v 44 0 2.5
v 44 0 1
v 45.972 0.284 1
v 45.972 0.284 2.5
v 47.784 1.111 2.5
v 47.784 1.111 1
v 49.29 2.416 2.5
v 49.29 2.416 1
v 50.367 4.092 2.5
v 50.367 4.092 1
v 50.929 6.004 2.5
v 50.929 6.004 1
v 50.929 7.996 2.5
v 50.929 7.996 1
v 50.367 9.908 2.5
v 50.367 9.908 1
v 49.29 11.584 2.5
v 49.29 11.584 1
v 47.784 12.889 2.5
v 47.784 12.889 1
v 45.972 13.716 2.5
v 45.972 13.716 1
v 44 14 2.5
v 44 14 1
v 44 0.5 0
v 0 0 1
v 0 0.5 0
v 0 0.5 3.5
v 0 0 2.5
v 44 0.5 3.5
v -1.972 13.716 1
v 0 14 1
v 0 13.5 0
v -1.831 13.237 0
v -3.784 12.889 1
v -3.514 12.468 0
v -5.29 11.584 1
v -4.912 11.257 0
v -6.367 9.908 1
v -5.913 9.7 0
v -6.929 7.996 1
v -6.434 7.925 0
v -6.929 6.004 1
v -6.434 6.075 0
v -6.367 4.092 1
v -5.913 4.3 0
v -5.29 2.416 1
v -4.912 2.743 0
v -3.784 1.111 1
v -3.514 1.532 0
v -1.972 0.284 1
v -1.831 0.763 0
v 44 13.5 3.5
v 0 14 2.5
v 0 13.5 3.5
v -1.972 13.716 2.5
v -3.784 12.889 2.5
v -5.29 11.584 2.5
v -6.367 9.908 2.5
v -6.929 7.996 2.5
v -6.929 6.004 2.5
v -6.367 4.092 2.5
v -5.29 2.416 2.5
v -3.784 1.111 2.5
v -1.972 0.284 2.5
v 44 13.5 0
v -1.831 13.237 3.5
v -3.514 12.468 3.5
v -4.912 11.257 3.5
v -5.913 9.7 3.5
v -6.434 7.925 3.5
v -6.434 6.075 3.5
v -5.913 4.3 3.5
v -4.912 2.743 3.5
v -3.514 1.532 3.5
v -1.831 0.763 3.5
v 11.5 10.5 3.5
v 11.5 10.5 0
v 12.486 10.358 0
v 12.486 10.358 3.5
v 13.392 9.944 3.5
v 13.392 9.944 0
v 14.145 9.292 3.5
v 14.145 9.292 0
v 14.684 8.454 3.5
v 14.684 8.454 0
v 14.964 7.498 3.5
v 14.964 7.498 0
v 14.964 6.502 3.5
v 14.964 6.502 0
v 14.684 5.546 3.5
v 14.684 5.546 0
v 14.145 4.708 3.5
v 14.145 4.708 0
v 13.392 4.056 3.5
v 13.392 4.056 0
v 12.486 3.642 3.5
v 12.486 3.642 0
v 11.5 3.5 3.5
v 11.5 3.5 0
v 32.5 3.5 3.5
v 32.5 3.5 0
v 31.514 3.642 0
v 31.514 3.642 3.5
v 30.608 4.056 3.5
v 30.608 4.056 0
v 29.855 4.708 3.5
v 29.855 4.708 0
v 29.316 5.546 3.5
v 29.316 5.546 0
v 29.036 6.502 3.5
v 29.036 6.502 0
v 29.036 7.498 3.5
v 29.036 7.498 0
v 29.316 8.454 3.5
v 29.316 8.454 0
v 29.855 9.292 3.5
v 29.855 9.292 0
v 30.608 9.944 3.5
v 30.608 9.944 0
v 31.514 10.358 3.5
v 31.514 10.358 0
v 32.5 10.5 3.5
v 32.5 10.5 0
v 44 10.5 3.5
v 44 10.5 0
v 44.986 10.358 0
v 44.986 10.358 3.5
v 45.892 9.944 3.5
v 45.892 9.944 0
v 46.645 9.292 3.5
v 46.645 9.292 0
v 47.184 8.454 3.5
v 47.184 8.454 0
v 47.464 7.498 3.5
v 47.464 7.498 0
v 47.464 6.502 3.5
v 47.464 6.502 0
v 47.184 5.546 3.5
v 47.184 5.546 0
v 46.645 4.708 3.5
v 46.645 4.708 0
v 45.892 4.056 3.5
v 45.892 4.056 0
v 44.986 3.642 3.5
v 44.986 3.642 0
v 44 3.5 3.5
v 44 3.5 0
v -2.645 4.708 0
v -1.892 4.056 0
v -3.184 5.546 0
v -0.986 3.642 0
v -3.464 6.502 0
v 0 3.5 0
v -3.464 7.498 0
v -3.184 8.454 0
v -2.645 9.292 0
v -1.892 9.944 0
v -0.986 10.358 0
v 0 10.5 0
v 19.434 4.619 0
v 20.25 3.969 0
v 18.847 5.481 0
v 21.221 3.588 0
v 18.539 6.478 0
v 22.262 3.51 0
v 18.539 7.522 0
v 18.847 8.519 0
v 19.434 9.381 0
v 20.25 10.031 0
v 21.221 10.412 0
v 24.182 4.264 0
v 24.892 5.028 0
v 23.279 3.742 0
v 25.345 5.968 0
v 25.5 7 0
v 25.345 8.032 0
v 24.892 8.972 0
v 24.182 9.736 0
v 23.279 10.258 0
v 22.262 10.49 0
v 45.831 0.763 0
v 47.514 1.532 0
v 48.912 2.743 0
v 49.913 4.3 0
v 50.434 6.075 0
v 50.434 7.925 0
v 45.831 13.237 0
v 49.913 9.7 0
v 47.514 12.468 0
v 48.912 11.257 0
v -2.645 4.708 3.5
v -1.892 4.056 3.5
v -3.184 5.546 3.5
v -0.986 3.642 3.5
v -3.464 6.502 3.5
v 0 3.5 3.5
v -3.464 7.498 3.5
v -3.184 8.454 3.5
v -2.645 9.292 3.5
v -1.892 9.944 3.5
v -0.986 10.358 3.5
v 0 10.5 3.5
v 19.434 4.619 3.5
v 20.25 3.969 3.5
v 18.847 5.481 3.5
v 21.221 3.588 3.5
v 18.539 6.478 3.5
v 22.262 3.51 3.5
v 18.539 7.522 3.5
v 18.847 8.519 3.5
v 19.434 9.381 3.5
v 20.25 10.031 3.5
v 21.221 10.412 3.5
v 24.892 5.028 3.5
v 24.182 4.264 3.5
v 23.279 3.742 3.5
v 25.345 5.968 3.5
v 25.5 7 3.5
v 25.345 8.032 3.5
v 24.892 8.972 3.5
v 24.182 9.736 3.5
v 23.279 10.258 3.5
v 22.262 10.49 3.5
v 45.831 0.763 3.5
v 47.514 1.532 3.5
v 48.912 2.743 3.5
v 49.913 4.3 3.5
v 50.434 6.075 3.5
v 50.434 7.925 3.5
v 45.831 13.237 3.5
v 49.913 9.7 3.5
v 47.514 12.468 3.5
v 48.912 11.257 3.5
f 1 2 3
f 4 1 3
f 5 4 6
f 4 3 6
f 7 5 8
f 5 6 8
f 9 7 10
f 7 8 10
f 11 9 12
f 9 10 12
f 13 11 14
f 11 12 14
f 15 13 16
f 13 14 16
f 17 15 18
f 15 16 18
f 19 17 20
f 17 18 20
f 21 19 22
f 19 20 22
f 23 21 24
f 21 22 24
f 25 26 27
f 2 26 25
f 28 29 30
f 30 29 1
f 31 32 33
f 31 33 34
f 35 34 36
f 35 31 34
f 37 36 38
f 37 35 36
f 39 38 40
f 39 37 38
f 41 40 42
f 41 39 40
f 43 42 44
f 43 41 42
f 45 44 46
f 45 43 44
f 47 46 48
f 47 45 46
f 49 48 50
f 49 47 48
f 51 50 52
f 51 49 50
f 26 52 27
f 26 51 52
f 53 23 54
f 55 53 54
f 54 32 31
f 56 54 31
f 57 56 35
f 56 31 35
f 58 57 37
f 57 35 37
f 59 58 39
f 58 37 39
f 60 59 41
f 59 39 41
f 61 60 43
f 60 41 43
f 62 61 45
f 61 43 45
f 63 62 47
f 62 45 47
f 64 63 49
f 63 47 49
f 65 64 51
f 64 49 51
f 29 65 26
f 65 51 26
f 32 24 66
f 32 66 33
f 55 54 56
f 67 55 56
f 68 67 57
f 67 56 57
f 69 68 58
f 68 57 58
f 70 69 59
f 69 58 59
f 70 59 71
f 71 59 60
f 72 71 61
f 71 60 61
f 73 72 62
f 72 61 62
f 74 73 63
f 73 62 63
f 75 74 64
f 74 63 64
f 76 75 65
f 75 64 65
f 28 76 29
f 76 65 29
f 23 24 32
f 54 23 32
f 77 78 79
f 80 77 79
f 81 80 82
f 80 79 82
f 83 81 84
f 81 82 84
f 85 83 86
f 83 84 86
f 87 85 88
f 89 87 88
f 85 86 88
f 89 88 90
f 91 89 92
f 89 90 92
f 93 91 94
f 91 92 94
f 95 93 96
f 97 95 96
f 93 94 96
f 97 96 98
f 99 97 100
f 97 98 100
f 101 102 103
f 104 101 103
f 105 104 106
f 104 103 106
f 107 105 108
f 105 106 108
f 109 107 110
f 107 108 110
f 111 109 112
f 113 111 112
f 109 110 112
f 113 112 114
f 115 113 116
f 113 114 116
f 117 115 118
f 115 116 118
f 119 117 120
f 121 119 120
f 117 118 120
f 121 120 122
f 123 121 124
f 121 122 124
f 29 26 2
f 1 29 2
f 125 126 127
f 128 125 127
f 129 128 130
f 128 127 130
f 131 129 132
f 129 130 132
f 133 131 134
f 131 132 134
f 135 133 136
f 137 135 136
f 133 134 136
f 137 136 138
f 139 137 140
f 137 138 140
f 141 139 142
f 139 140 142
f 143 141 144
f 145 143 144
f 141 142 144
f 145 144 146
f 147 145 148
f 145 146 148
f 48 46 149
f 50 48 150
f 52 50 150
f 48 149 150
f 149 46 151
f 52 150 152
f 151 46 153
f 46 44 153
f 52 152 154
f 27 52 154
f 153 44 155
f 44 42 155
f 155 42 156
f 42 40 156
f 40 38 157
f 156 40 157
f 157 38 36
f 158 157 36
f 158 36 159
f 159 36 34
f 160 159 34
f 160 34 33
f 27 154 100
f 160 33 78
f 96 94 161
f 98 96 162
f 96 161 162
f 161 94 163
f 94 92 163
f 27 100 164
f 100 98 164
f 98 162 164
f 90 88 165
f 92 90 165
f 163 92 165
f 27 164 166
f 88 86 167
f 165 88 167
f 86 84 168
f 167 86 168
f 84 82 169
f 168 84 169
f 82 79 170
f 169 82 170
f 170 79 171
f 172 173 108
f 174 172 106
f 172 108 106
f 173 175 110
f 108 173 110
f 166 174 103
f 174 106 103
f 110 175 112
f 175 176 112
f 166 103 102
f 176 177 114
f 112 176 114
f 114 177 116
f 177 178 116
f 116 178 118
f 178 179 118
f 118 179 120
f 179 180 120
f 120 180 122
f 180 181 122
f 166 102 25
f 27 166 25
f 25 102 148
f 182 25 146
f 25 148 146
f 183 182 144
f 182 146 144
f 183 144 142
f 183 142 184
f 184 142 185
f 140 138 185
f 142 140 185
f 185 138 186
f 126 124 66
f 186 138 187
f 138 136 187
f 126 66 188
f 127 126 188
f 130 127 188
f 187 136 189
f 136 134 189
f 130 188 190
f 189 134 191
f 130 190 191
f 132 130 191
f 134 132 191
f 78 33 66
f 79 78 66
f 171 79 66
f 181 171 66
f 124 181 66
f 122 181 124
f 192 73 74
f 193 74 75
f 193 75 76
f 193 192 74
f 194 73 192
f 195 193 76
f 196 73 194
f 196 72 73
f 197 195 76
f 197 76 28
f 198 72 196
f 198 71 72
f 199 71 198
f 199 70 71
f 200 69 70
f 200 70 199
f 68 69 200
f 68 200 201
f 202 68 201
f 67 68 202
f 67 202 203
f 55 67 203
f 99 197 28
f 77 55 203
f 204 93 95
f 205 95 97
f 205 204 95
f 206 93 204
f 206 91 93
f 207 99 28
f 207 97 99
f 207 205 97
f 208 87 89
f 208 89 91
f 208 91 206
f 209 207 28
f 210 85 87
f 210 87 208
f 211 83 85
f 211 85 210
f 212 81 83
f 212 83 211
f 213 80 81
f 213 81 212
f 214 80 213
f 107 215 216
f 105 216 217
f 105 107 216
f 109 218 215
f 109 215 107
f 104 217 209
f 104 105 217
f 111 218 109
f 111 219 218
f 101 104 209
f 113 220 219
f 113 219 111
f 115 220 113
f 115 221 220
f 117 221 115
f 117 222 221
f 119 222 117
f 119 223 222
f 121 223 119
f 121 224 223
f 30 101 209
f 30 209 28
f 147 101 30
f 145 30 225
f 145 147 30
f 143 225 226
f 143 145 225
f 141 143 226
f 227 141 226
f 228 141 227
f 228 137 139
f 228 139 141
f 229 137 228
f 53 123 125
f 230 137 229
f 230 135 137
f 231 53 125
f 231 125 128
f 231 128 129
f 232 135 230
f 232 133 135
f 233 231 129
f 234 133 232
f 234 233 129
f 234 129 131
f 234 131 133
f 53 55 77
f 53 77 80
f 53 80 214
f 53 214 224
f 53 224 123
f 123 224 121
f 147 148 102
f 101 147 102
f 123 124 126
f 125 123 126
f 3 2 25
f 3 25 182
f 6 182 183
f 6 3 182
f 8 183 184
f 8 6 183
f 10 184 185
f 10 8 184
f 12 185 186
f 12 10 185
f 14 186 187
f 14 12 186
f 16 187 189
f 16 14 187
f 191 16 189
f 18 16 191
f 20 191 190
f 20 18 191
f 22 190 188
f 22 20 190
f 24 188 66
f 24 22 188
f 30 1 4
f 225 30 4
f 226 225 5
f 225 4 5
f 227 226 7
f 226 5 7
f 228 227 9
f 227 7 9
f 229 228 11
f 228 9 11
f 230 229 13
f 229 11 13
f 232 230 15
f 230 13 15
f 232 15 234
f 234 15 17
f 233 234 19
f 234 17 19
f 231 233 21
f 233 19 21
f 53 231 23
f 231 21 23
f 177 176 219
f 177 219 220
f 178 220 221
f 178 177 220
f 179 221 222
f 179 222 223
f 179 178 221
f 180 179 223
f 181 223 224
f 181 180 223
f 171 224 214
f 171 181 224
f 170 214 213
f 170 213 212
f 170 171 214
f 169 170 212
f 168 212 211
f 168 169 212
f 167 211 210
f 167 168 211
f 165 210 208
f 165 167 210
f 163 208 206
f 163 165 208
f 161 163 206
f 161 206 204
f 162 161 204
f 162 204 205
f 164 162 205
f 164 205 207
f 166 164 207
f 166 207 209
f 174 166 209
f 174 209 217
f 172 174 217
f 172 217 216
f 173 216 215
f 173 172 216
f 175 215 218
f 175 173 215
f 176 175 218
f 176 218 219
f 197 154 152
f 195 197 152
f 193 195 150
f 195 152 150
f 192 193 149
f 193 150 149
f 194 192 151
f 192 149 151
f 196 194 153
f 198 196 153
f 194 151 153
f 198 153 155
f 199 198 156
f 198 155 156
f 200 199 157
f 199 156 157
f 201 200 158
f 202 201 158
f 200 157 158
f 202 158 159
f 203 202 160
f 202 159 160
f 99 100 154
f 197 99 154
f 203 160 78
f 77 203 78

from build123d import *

# Parameters (mm, degrees)
F0_R       = 3.5
F1_DEPTH   = 3.5
F2_SIZE2   = 1
F2_SIZE    = 0.5
F2_2_SIZE2 = 1
F2_2_SIZE  = 0.5


with BuildPart() as f1:
    # F0 (on Top) → F1 (new body)
    with BuildSketch(Plane.XY):
        with BuildLine():
            ThreePointArc((0, 14), (-7, 7), (0, 0))
            Line((0, 0), (44, 0))
            ThreePointArc((44, 0), (51, 7), (44, 14))
            Line((44, 14), (0, 14))
        make_face()
        with BuildLine():
            ThreePointArc((0, 3.5), (-3.5, 7), (0, 10.5))
            Line((0, 10.5), (11.5, 10.5))
            ThreePointArc((11.5, 10.5), (15, 7), (11.5, 3.5))
            Line((11.5, 3.5), (0, 3.5))
        make_face(mode=Mode.SUBTRACT)
        with Locations((22, 7)):
            Circle(F0_R, mode=Mode.SUBTRACT)
        with BuildLine():
            ThreePointArc((32.5, 3.5), (29, 7), (32.5, 10.5))
            Line((32.5, 10.5), (44, 10.5))
            ThreePointArc((44, 10.5), (47.5, 7), (44, 3.5))
            Line((44, 3.5), (32.5, 3.5))
        make_face(mode=Mode.SUBTRACT)
    extrude(amount=F1_DEPTH)

    # F2
    f2_edges = [f1.edges().sort_by_distance(p)[0] for p in [
        (22, 0, 3.5),
    ]]
    f2_side = f1.faces().sort_by_distance((22, 0.596657, 3.5))[0]
    chamfer(f2_edges, length=F2_SIZE, length2=F2_SIZE2, reference=f2_side)

    # F2#2
    f2_2_edges = [f1.edges().sort_by_distance(p)[0] for p in [
        (22, 0, 0),
    ]]
    f2_2_side = f1.faces().sort_by_distance((22, 0.596657, 0))[0]
    chamfer(f2_2_edges, length=F2_2_SIZE, length2=F2_2_SIZE2, reference=f2_2_side)


solid = f1.part
